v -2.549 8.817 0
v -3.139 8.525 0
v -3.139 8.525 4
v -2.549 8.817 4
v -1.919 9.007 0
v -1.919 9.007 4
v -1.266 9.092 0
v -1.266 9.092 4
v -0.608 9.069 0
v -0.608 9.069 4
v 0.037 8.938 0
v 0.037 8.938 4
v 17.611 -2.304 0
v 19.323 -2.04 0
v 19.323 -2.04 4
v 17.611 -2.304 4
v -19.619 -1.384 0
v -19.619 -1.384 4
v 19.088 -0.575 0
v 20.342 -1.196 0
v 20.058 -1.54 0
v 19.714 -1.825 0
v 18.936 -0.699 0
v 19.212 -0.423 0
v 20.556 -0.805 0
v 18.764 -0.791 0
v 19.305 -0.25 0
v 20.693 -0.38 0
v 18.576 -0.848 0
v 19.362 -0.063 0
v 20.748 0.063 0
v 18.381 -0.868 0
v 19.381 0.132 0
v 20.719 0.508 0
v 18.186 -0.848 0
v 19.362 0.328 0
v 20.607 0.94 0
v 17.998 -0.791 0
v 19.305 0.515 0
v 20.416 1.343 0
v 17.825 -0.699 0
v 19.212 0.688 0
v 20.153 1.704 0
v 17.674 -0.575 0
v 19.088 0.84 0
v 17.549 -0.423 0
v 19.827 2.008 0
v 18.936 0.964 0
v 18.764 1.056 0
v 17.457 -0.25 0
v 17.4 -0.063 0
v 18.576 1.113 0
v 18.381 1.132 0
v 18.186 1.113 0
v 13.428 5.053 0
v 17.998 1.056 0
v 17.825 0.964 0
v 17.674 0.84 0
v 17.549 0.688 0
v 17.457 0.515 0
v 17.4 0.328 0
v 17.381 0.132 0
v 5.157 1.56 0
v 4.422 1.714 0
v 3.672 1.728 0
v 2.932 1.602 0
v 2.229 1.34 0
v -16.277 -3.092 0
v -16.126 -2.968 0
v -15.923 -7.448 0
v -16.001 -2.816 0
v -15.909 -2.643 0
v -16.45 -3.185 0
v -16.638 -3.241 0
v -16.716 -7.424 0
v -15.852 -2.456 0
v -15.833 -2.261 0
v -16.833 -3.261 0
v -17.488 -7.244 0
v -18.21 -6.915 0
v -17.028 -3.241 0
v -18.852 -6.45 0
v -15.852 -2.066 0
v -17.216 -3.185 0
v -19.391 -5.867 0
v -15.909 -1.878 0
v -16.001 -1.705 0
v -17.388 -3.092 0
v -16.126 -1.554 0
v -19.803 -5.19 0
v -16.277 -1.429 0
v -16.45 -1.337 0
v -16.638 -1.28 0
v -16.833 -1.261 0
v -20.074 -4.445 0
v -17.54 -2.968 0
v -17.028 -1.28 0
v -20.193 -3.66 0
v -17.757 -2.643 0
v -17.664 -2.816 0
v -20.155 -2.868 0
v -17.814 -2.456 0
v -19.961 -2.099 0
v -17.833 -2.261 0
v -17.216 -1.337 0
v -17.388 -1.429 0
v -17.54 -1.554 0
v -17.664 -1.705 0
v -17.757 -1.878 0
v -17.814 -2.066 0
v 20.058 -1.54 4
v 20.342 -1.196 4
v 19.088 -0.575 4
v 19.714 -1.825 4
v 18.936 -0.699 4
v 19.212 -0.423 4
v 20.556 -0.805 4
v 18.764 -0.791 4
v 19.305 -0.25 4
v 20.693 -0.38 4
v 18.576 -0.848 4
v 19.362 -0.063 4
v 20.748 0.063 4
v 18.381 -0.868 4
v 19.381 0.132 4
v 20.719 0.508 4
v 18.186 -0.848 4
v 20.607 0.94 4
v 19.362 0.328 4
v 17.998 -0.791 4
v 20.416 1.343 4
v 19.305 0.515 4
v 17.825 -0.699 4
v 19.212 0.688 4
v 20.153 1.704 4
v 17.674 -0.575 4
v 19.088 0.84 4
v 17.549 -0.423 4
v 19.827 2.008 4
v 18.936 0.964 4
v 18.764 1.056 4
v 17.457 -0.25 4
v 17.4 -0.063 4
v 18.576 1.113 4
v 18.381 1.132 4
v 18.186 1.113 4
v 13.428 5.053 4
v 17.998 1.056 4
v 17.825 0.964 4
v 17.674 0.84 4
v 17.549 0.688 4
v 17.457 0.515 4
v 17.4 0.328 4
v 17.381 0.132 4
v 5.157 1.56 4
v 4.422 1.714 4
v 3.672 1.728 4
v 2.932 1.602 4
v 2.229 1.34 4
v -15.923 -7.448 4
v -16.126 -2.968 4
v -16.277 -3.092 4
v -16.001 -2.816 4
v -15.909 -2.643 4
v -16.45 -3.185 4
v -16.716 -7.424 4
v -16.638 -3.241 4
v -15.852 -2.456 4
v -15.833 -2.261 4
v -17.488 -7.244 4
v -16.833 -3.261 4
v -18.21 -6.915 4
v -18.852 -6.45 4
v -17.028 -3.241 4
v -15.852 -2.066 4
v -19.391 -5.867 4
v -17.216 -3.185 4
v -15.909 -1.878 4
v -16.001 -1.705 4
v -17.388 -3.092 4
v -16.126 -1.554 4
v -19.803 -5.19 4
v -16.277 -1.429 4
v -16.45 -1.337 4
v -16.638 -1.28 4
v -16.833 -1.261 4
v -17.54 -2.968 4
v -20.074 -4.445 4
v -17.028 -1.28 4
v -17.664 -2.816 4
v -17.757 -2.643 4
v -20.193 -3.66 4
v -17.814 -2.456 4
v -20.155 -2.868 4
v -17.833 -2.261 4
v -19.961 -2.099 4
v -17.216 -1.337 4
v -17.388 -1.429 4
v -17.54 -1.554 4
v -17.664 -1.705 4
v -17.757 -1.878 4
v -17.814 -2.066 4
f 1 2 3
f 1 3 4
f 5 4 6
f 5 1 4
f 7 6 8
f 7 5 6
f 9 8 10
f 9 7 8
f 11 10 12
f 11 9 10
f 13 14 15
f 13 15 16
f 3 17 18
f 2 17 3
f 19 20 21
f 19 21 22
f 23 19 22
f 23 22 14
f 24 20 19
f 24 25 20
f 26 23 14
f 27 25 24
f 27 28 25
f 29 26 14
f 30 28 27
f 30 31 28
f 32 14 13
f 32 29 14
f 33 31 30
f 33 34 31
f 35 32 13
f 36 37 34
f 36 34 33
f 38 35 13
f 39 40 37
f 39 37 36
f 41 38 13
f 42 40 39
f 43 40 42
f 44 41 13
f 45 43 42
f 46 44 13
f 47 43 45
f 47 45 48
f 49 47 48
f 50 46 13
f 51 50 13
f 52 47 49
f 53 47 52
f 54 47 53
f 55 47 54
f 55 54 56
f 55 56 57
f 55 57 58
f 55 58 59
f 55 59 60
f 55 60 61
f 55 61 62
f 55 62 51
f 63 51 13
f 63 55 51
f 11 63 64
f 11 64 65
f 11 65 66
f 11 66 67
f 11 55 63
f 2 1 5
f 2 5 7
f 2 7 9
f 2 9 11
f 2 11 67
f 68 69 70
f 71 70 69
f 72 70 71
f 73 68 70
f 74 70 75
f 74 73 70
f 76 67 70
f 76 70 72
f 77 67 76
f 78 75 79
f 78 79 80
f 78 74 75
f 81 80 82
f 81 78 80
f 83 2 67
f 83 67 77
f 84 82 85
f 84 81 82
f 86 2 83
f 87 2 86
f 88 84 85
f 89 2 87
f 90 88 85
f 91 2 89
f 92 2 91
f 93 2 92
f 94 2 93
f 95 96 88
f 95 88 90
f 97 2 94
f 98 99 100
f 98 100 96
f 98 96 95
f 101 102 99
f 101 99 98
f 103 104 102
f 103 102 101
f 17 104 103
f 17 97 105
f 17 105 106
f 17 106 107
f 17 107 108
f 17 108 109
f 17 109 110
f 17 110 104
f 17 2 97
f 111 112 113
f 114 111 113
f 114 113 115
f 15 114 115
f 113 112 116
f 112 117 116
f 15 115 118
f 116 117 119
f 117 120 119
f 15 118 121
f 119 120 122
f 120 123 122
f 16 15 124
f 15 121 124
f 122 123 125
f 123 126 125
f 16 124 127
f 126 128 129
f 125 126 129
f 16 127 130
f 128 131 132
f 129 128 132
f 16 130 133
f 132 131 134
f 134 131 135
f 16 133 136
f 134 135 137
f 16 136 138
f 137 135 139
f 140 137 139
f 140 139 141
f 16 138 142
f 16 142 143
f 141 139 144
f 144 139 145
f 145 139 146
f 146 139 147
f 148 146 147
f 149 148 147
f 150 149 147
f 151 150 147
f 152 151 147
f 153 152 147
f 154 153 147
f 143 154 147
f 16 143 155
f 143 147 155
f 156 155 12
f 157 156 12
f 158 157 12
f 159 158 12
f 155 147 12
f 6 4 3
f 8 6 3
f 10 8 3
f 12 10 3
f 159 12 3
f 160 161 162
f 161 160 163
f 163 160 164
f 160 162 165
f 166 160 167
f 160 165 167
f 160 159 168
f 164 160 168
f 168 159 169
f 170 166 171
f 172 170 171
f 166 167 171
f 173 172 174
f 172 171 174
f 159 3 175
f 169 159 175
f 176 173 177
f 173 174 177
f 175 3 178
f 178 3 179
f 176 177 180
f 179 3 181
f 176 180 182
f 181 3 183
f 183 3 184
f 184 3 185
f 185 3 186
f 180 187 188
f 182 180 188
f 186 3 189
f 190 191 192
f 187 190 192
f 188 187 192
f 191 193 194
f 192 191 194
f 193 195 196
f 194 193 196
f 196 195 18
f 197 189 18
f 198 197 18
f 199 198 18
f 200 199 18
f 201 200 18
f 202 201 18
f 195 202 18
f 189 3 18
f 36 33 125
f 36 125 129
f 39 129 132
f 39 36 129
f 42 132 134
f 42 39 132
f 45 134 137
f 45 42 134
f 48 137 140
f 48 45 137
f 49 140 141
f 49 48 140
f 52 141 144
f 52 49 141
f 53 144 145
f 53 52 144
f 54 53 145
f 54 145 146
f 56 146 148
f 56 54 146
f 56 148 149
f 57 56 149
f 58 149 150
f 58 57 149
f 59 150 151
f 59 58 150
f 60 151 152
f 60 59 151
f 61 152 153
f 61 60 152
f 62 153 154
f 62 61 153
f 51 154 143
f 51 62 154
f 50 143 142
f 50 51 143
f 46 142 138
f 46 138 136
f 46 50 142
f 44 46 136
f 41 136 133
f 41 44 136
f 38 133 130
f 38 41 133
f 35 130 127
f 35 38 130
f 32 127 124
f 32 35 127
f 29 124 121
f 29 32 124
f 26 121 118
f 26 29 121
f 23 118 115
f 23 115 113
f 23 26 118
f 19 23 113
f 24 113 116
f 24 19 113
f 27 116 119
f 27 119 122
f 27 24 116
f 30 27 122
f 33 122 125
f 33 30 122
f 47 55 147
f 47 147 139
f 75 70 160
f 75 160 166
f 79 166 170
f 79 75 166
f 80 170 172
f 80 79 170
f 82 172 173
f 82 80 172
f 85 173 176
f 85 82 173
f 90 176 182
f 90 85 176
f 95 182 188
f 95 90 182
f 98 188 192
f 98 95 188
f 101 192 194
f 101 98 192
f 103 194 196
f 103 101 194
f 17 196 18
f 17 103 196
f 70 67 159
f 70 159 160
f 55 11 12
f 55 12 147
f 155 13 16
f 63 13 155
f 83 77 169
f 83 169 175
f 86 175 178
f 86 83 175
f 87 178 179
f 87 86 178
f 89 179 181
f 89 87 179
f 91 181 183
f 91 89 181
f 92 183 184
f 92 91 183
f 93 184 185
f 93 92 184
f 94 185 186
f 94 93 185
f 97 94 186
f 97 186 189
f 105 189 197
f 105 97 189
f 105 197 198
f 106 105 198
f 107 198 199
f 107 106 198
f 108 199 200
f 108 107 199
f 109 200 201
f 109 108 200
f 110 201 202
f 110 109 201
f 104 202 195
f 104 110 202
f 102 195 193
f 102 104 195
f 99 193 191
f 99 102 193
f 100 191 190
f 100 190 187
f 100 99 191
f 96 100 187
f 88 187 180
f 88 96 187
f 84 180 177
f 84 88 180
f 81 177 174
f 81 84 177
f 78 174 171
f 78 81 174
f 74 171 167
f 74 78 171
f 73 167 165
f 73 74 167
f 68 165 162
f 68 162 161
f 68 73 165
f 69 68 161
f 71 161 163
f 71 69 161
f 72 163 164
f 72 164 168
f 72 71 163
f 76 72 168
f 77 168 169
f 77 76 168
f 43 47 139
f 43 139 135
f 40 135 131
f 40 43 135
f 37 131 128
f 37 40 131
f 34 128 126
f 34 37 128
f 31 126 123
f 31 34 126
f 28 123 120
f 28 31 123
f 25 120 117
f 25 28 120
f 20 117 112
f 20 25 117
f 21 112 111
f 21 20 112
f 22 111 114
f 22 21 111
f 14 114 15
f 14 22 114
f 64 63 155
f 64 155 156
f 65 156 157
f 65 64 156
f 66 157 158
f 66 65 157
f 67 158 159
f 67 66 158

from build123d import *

# Parameters (mm, degrees)
SKETCH1_R           = 1
BOSS_EXTRUDE1_DEPTH = 4


with BuildPart() as part:
    # Sketch1 → Boss-Extrude1 (new body)
    with BuildSketch(Plane.XY):
        with BuildLine():
            ThreePointArc((5.156576759, 1.559717202), (3.671639417, 1.728041702), (2.228559137, 1.33959434))
            Line((2.228559137, 1.33959434), (-15.922809802, -7.447699535))
            ThreePointArc((-15.922809802, -7.447699535), (-19.613741884, -5.538880366), (-19.618658264, -1.383576999))
            Line((-19.618658264, -1.383576999), (-3.138918463, 8.524968964))
            ThreePointArc((-3.138918463, 8.524968964), (-1.594204388, 9.063420424), (0.036885671, 8.938453372))
            Line((0.036885671, 8.938453372), (13.428494888, 5.052778925))
            Line((13.428494888, 5.052778925), (19.826885957, 2.008227813))
            ThreePointArc((19.826885957, 2.008227813), (20.731162158, -0.159872308), (19.323277912, -2.040360419))
            Line((19.323277912, -2.040360419), (17.611370722, -2.303684453))
            Line((17.611370722, -2.303684453), (5.156576759, 1.559717202))
        make_face()
        with Locations((-16.832912189, -2.260702488)):
            Circle(SKETCH1_R, mode=Mode.SUBTRACT)
        with Locations((18.38085461, 0.132484859)):
            Circle(SKETCH1_R, mode=Mode.SUBTRACT)
    extrude(amount=BOSS_EXTRUDE1_DEPTH)


solid = part.part
